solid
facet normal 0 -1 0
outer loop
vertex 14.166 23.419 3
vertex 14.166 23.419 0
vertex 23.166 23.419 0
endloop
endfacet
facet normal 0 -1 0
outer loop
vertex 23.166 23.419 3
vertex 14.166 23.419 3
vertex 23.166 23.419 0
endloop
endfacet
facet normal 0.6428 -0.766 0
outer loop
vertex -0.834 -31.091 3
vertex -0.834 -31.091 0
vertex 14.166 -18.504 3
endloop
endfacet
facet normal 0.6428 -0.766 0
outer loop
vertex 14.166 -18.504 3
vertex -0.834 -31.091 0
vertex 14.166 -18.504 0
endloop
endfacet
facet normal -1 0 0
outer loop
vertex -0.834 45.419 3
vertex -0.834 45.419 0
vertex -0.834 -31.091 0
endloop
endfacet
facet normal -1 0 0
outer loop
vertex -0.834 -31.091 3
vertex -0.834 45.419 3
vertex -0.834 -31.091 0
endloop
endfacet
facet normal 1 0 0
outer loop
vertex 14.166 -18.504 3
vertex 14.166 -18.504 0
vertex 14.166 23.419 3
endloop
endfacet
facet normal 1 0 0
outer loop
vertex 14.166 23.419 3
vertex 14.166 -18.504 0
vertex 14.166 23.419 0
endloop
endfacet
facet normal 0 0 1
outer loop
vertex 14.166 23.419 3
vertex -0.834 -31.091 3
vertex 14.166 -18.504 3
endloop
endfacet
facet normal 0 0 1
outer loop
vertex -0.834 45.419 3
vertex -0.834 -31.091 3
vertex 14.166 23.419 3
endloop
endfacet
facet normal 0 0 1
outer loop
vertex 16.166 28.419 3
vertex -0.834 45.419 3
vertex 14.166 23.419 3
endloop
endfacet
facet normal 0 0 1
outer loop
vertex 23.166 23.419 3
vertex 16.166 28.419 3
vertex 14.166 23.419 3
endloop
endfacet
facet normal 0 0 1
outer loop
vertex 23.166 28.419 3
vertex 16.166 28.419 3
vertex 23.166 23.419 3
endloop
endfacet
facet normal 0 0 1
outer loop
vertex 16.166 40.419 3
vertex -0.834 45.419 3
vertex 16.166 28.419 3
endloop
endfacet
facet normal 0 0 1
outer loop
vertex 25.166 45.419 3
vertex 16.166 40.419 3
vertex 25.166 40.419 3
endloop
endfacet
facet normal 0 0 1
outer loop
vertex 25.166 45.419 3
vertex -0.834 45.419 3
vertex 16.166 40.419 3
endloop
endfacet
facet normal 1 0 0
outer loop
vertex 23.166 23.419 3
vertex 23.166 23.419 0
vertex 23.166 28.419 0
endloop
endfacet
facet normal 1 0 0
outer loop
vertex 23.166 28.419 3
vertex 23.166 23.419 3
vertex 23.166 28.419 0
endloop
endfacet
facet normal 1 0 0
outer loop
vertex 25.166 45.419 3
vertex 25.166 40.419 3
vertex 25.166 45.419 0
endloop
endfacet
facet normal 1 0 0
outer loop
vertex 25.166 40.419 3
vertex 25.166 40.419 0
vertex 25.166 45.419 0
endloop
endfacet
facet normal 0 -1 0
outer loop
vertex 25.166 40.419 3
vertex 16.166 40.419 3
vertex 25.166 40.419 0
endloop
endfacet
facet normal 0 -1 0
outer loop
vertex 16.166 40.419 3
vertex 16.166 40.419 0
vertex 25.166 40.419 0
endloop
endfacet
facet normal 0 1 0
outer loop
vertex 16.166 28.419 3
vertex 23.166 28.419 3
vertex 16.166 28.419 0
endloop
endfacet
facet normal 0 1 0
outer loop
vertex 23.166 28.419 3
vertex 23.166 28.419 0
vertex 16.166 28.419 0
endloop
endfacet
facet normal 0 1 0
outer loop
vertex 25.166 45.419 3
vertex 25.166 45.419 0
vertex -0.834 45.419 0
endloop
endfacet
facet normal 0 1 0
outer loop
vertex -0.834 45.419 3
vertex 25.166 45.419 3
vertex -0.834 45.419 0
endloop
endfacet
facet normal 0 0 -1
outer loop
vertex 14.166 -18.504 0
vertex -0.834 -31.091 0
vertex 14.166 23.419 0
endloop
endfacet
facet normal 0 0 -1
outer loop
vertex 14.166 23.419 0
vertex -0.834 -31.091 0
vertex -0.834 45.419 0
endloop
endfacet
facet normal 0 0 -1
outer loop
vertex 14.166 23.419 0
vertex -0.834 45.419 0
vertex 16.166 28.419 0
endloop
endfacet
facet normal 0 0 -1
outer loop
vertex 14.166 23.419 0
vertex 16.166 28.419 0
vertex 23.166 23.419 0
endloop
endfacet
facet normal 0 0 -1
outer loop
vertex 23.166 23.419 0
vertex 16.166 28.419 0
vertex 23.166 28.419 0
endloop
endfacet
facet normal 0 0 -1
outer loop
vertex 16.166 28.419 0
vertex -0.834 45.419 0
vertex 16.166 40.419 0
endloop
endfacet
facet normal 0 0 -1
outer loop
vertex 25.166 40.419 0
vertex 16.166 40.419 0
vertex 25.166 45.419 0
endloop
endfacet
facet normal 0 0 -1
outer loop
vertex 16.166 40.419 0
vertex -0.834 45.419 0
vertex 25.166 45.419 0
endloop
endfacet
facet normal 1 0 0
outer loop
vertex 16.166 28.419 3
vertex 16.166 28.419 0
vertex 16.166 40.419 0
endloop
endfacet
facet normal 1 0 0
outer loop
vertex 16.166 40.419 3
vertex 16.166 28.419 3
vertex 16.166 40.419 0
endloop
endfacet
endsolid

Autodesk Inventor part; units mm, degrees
ref_plane "YZ Plane" through (0, 0, 0) normal (1, 0, 0) x (0, 1, 0)
ref_plane "XZ Plane" through (0, 0, 0) normal (0, 1, 0) x (-1, 0, 0)
ref_plane "XY Plane" through (0, 0, 0) normal (0, 0, 1) x (1, 0, 0)
sketch "Sketch2" plane through (0, 0, 0) normal (0, 0, 1) x (1, 0, 0)
  line L0 (-0.8337, 45.419) -> (-0.8337, -31.091)
  line L1 (-0.8337, -31.091) -> (14.1663, -18.5045)
  line L2 (14.1663, -18.5045) -> (14.1663, 23.419)
  line L3 (14.1663, 23.419) -> (23.1663, 23.419)
  line L4 (23.1663, 23.419) -> (23.1663, 28.419)
  line L5 (23.1663, 28.419) -> (16.1663, 28.419)
  line L6 (16.1663, 28.419) -> (16.1663, 40.419)
  line L7 (16.1663, 40.419) -> (25.1663, 40.419)
  line L8 (25.1663, 40.419) -> (25.1663, 45.419)
  line L9 (25.1663, 45.419) -> (-0.8337, 45.419)
  line L10 (16.1663, 28.419) -> (14.1663, 28.419) construction
  line L11 (1.3388, 42.919) -> (15.1663, 42.919)
  line L12 (15.1663, 42.919) -> (15.1663, 41.2824)
  line L13 (15.1663, 41.2824) -> (1.3388, 41.2824)
  line L14 (1.3388, 41.2824) -> (1.3388, 42.919)
  line L15 (11.0785, 23.419) -> (12.1663, 23.419)
  line L16 (12.1663, 23.419) -> (12.1663, -12.6156)
  line L17 (12.1663, -12.6156) -> (11.0785, -12.6156)
  line L18 (11.0785, -12.6156) -> (11.0785, 23.419)
  line L19 (2.2805, -14.4359) -> (12.1663, -14.4359)
  line L20 (12.1663, -14.4359) -> (12.1663, -16.121)
  line L21 (12.1663, -16.121) -> (2.2805, -16.121)
  line L22 (2.2805, -16.121) -> (2.2805, -14.4359)
  dimension "d17" = 2
  dimension "d18" = 7
  dimension "d19" = 9
  dimension "d20" = 5
  dimension "d21" = 5
  dimension "d22" = 15
  dimension "d23" = 12
  dimension "d24" = 2
  dimension "d25" = 46.9235
  dimension "d26" = 130
extrude "Extrusion1" add sketch "Sketch2" along normal blind 3 contours L9 L8 L7 L6 L5 L4 L3 L2 L1 L0 | L11 L12 L13 L14 | L15 L16 L17 L18 | L19 L20 L21 L22
properties part number "k2_t_side"
